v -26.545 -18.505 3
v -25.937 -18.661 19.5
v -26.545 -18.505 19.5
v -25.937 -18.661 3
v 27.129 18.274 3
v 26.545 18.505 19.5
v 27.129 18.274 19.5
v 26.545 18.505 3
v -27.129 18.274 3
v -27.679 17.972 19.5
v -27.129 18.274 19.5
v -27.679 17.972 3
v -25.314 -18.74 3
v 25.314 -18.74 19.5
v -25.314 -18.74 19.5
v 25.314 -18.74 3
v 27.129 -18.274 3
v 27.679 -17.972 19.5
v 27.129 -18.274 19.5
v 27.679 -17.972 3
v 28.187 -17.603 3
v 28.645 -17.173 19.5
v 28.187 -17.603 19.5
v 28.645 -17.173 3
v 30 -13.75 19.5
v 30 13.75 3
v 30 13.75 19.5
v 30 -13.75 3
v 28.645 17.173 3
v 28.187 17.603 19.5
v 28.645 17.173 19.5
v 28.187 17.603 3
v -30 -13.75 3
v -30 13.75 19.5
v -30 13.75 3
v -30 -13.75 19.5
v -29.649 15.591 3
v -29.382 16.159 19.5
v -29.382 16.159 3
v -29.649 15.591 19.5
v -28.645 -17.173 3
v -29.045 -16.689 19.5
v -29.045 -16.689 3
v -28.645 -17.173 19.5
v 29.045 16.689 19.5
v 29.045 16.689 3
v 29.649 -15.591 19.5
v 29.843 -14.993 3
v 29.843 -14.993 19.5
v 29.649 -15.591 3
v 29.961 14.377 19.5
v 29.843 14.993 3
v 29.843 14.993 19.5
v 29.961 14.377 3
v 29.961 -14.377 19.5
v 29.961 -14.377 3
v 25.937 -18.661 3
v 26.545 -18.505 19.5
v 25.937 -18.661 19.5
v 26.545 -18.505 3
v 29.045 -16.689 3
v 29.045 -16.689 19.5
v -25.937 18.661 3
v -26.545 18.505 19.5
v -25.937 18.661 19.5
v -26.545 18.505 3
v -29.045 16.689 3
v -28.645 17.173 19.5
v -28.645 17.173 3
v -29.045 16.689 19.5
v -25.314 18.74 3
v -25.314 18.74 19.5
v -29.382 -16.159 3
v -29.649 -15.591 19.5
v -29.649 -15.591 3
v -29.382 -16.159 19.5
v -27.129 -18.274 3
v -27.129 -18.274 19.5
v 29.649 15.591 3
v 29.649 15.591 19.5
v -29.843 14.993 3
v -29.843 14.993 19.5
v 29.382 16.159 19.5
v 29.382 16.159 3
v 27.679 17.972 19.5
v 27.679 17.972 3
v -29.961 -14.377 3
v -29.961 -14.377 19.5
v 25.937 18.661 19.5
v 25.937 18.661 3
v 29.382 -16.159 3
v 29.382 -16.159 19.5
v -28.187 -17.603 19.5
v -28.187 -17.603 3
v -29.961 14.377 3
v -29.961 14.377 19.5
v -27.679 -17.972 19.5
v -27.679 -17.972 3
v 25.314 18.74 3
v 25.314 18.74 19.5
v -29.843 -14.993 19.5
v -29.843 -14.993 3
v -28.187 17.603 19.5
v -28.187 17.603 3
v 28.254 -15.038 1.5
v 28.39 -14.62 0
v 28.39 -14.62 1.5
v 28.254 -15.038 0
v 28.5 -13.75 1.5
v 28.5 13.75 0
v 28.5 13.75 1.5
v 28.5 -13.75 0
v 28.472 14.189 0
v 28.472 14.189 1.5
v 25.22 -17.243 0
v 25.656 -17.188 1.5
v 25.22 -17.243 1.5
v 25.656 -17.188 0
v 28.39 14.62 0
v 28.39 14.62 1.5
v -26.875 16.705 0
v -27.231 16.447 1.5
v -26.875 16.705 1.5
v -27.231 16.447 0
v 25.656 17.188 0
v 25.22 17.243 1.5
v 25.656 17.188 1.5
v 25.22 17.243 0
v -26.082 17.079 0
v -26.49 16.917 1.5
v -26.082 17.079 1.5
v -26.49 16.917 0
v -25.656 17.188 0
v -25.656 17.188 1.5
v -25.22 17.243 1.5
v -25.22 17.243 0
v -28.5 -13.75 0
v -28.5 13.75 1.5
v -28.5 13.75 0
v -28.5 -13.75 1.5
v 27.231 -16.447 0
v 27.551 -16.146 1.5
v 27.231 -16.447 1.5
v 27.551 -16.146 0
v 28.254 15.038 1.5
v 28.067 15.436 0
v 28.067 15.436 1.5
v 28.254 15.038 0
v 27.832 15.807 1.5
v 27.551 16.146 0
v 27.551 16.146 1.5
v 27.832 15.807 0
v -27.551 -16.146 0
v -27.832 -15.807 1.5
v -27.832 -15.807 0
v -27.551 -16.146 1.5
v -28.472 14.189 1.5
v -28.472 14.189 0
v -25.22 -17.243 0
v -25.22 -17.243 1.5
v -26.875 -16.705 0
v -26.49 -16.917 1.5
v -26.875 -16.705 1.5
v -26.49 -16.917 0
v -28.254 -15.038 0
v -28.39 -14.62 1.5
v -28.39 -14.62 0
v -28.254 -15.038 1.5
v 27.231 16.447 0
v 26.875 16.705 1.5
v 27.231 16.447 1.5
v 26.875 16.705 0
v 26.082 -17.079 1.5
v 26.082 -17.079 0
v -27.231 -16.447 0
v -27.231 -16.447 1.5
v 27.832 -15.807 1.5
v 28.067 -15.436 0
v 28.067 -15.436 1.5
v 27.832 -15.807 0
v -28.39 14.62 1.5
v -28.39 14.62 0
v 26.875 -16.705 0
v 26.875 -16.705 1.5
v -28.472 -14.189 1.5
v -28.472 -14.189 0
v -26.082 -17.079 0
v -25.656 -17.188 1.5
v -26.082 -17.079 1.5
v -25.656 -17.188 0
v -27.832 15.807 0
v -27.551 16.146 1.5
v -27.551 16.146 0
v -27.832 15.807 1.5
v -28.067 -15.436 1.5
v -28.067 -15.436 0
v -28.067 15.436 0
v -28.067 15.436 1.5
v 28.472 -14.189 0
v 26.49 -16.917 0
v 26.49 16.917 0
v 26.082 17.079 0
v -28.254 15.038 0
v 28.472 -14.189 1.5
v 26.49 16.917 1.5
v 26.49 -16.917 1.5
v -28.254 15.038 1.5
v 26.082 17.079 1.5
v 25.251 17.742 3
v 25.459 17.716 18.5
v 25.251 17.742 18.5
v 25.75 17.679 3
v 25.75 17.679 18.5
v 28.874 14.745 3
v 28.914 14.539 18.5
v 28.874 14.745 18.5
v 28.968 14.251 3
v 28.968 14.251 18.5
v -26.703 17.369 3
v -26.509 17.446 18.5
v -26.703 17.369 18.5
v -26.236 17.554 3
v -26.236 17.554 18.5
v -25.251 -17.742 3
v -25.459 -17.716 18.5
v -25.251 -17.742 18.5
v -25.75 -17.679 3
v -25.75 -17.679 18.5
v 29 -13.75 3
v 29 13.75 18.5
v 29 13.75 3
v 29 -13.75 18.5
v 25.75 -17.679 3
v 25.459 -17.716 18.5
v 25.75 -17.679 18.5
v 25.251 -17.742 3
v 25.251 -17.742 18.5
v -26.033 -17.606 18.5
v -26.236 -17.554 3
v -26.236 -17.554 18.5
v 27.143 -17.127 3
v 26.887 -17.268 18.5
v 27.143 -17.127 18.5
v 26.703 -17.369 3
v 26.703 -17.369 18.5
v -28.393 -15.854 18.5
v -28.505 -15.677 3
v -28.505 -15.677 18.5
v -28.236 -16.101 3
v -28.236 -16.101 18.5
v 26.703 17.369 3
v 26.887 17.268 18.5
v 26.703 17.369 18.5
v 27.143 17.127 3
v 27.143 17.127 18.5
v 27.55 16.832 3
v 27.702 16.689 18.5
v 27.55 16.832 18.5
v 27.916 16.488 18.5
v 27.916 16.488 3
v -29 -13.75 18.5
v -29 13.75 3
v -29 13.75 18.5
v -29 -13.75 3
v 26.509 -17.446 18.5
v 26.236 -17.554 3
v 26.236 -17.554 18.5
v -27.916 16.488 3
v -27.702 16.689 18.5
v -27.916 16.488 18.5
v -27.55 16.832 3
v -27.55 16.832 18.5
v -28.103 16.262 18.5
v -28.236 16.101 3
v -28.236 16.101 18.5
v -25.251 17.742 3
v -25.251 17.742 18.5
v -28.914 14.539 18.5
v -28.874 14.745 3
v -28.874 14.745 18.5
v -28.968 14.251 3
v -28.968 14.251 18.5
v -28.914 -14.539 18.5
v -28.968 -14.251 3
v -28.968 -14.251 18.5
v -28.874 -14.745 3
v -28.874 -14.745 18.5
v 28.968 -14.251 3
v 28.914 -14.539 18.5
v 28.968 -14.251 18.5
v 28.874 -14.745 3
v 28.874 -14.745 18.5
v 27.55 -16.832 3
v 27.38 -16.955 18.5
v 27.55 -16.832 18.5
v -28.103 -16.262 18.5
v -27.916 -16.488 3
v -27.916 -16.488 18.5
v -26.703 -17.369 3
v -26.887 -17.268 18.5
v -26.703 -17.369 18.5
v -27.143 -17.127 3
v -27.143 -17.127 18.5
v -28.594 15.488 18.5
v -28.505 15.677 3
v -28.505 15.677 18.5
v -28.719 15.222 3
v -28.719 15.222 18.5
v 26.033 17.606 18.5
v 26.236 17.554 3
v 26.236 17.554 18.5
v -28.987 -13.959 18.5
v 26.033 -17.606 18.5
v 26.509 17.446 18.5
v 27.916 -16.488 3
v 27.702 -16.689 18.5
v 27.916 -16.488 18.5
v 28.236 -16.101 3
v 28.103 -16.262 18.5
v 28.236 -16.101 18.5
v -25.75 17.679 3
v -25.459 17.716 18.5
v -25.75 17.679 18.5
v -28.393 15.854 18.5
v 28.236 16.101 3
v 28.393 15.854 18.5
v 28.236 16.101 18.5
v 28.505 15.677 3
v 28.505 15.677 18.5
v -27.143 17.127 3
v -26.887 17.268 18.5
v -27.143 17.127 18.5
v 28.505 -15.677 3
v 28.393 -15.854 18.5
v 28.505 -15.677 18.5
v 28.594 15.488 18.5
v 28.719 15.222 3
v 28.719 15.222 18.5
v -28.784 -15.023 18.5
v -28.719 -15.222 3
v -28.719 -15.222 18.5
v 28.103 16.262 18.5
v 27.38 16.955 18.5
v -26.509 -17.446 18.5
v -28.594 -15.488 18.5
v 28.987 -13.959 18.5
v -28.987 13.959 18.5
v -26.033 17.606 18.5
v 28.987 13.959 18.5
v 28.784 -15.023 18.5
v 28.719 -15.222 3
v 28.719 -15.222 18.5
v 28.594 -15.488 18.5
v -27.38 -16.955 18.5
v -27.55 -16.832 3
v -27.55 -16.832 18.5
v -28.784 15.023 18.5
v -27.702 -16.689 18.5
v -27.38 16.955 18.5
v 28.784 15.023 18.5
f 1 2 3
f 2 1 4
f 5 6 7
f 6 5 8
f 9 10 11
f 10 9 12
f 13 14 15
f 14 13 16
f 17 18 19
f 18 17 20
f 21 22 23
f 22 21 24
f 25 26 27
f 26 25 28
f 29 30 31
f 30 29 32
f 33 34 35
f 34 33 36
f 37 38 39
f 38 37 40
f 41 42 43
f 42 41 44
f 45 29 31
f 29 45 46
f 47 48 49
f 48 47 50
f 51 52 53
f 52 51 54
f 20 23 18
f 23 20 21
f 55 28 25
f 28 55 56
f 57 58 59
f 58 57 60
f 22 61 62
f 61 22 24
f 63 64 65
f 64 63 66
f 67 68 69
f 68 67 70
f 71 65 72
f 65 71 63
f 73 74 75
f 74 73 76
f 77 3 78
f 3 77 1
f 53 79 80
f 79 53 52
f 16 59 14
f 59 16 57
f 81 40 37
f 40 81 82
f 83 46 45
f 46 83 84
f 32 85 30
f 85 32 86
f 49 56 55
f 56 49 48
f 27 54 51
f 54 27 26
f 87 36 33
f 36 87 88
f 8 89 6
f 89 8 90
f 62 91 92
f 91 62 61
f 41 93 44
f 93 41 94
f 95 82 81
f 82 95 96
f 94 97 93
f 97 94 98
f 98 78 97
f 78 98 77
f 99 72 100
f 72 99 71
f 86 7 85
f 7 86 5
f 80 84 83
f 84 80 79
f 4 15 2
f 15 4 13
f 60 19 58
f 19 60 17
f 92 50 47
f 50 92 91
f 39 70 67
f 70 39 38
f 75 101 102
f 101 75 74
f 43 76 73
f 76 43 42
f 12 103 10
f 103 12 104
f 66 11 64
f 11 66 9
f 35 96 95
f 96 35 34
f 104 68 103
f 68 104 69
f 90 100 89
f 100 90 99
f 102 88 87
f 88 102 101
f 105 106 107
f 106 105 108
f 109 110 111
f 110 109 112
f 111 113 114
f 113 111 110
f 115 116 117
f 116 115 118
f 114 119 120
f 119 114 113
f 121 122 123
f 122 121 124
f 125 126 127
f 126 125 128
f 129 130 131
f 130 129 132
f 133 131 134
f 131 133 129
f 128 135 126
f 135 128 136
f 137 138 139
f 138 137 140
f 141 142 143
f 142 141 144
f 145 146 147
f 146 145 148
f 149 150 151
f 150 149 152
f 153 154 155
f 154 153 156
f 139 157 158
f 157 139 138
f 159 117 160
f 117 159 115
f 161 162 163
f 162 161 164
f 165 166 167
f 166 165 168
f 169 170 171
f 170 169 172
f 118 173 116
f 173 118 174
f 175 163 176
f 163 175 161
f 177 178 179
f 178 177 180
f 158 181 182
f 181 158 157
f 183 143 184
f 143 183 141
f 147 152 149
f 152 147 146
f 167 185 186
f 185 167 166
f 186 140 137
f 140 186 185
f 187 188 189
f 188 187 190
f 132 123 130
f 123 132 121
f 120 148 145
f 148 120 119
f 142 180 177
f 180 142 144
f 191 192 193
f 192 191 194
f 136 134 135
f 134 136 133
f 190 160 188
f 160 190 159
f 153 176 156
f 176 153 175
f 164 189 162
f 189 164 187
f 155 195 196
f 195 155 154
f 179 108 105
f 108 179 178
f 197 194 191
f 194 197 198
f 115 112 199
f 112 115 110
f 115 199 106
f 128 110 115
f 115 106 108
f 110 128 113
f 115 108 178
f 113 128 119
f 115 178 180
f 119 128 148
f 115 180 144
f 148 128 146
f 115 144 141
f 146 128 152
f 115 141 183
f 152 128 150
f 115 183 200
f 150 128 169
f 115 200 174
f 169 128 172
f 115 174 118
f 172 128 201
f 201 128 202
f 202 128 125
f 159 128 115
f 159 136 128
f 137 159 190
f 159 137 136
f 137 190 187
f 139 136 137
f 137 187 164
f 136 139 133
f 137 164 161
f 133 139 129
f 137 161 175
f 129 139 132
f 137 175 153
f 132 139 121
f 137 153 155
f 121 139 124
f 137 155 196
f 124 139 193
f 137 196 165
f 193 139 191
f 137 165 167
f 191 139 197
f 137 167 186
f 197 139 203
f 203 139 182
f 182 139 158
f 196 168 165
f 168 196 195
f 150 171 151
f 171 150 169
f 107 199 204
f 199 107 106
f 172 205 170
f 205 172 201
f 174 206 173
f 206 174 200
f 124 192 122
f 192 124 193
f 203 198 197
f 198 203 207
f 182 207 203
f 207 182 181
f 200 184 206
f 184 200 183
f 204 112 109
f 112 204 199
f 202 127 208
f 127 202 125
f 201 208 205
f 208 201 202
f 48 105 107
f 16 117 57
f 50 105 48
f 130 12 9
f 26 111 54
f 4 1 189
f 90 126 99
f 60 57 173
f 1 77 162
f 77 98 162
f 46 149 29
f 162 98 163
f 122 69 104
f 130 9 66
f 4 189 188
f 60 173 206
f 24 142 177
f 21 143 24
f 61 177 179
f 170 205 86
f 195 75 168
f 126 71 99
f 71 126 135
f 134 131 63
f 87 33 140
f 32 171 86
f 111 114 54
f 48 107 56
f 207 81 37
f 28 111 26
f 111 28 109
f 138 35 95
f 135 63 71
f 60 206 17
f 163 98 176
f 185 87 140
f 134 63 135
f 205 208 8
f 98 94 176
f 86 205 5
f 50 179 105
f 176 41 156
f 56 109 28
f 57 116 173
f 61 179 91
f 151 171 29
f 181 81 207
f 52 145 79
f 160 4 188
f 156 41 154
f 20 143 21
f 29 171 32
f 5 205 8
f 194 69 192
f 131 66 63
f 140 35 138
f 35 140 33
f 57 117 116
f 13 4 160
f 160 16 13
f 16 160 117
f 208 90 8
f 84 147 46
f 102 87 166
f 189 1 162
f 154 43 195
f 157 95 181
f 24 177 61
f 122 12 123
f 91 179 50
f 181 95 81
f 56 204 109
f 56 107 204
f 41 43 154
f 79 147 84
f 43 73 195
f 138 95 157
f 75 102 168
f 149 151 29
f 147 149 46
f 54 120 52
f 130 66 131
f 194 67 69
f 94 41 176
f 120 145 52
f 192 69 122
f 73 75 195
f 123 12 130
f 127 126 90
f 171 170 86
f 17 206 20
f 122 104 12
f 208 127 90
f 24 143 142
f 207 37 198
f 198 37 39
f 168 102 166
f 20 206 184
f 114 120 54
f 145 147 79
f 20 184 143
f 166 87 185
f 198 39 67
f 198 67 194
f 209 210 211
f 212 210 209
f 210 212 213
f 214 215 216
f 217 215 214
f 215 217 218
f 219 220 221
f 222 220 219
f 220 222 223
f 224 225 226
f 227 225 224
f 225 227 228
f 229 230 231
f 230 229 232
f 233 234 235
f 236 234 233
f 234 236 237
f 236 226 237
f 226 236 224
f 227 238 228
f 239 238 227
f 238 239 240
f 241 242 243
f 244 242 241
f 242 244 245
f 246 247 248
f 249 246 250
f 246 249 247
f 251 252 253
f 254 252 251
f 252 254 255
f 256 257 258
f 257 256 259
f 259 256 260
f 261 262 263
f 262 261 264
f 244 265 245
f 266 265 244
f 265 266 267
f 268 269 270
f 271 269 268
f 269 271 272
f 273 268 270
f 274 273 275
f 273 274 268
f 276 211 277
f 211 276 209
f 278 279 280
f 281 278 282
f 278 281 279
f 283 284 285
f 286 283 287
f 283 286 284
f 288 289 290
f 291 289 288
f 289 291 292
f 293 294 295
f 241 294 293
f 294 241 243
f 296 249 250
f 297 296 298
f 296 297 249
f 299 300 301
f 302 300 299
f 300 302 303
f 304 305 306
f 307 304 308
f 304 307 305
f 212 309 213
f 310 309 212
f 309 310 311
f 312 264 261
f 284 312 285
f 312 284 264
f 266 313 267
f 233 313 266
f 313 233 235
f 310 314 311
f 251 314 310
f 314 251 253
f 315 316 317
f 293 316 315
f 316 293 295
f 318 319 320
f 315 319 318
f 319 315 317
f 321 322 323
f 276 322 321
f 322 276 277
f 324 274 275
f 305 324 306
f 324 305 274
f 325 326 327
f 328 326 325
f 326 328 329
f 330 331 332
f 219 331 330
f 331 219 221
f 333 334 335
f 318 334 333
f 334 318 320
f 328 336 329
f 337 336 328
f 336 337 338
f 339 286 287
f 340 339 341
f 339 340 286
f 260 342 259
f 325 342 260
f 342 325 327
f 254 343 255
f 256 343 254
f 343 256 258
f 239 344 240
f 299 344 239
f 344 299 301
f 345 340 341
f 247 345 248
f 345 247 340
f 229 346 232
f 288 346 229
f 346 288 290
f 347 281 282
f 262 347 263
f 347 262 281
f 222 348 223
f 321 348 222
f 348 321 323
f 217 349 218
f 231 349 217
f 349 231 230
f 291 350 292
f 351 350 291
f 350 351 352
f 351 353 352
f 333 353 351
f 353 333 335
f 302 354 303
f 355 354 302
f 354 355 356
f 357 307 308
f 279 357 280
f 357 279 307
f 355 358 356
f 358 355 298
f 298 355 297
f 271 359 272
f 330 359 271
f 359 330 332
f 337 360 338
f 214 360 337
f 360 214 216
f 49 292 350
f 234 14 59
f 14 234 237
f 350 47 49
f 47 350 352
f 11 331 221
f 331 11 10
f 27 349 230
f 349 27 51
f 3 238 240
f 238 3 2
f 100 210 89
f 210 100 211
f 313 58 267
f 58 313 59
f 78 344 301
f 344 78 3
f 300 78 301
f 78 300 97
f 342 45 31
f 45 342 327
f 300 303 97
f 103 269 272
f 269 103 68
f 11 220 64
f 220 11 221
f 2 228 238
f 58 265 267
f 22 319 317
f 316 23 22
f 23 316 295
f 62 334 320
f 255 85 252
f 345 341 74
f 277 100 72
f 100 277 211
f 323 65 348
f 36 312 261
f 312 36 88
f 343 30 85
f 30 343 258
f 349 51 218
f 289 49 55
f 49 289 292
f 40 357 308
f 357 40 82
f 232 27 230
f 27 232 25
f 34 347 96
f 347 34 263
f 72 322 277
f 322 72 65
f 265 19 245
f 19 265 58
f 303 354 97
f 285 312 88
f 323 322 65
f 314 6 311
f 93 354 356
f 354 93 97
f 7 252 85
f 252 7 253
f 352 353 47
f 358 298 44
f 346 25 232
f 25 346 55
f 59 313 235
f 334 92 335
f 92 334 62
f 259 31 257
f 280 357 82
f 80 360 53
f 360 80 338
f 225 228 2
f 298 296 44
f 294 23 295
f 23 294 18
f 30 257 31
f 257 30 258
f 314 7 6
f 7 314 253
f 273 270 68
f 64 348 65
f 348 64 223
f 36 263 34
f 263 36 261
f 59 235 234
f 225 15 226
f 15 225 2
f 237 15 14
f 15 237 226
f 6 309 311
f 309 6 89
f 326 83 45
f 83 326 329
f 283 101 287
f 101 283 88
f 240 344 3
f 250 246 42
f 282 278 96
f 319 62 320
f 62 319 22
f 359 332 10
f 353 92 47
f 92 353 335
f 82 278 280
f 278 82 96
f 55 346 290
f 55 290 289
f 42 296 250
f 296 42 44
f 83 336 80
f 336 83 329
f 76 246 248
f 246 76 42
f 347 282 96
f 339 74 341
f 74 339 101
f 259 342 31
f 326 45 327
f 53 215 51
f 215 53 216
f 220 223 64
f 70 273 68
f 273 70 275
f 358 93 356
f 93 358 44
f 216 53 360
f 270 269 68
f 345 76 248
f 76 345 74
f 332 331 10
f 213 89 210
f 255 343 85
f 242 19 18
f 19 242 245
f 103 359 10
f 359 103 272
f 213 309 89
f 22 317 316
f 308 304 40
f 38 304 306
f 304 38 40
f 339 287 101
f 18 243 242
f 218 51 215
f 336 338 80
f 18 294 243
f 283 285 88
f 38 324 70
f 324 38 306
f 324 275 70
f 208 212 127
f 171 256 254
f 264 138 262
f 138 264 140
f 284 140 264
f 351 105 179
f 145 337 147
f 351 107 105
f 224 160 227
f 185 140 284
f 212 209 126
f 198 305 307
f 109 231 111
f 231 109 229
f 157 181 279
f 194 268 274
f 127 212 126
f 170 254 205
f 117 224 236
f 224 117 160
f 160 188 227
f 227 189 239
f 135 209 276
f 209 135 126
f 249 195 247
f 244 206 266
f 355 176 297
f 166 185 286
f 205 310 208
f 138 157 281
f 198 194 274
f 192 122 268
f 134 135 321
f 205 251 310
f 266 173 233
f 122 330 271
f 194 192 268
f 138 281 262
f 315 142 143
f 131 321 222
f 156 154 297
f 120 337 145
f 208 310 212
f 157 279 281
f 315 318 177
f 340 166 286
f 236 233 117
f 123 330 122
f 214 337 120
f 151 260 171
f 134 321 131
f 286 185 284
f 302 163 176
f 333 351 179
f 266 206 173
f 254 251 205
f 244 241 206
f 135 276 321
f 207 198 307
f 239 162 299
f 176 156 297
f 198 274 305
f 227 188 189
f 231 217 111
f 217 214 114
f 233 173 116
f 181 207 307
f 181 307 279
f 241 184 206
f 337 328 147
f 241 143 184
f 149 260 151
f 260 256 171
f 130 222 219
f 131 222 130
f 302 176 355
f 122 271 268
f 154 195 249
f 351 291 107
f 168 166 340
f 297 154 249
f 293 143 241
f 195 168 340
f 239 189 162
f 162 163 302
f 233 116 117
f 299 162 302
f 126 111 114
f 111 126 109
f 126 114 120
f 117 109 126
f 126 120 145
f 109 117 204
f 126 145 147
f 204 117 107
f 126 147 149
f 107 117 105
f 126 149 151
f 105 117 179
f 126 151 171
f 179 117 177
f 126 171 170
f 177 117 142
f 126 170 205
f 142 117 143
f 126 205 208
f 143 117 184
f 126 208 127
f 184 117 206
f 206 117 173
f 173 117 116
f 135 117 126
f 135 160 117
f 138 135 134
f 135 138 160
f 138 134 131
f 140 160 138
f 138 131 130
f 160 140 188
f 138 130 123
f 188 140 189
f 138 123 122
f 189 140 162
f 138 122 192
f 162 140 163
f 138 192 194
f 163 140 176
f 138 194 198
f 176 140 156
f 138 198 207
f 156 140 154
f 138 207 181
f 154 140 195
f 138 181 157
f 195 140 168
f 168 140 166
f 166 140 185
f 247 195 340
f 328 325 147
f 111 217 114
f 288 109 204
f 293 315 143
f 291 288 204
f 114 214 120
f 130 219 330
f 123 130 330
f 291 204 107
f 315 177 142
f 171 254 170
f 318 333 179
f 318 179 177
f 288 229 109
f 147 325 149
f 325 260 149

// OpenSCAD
$fn = 50;


difference() {
	union() {
		translate(v = [0, 0, 3.0000000000]) {
			hull() {
				translate(v = [-25.0000000000, 13.7500000000, 0]) {
					cylinder(h = 16.5000000000, r = 5);
				}
				translate(v = [25.0000000000, 13.7500000000, 0]) {
					cylinder(h = 16.5000000000, r = 5);
				}
				translate(v = [-25.0000000000, -13.7500000000, 0]) {
					cylinder(h = 16.5000000000, r = 5);
				}
				translate(v = [25.0000000000, -13.7500000000, 0]) {
					cylinder(h = 16.5000000000, r = 5);
				}
			}
		}
		hull() {
			translate(v = [-25.0000000000, 13.7500000000, 0]) {
				cylinder(h = 1.5000000000, r = 3.5000000000);
			}
			translate(v = [25.0000000000, 13.7500000000, 0]) {
				cylinder(h = 1.5000000000, r = 3.5000000000);
			}
			translate(v = [-25.0000000000, -13.7500000000, 0]) {
				cylinder(h = 1.5000000000, r = 3.5000000000);
			}
			translate(v = [25.0000000000, -13.7500000000, 0]) {
				cylinder(h = 1.5000000000, r = 3.5000000000);
			}
		}
		translate(v = [0, 0, 1.5000000000]) {
			hull() {
				translate(v = [-25.0000000000, 13.7500000000, 0]) {
					cylinder(h = 1.5000000000, r = 5, r1 = 3.5000000000, r2 = 5);
				}
				translate(v = [25.0000000000, 13.7500000000, 0]) {
					cylinder(h = 1.5000000000, r = 5, r1 = 3.5000000000, r2 = 5);
				}
				translate(v = [-25.0000000000, -13.7500000000, 0]) {
					cylinder(h = 1.5000000000, r = 5, r1 = 3.5000000000, r2 = 5);
				}
				translate(v = [25.0000000000, -13.7500000000, 0]) {
					cylinder(h = 1.5000000000, r = 5, r1 = 3.5000000000, r2 = 5);
				}
			}
		}
	}
	union() {
		translate(v = [0, 0, 3.0000000000]) {
			hull() {
				translate(v = [-25.0000000000, 13.7500000000, 0]) {
					cylinder(h = 16.5000000000, r = 4);
				}
				translate(v = [25.0000000000, 13.7500000000, 0]) {
					cylinder(h = 16.5000000000, r = 4);
				}
				translate(v = [-25.0000000000, -13.7500000000, 0]) {
					cylinder(h = 16.5000000000, r = 4);
				}
				translate(v = [25.0000000000, -13.7500000000, 0]) {
					cylinder(h = 16.5000000000, r = 4);
				}
			}
		}
		translate(v = [0, 0, 18]) {
			hull() {
				translate(v = [-25.0000000000, 13.7500000000, 0]) {
					cylinder(h = 1.5000000000, r = 5, r1 = 3.5000000000, r2 = 5);
				}
				translate(v = [25.0000000000, 13.7500000000, 0]) {
					cylinder(h = 1.5000000000, r = 5, r1 = 3.5000000000, r2 = 5);
				}
				translate(v = [-25.0000000000, -13.7500000000, 0]) {
					cylinder(h = 1.5000000000, r = 5, r1 = 3.5000000000, r2 = 5);
				}
				translate(v = [25.0000000000, -13.7500000000, 0]) {
					cylinder(h = 1.5000000000, r = 5, r1 = 3.5000000000, r2 = 5);
				}
			}
		}
		translate(v = [0, 0, 1.5000000000]) {
			hull() {
				translate(v = [-25.0000000000, 13.7500000000, 0]) {
					cylinder(h = 1.5000000000, r = 5, r1 = 3.5000000000, r2 = 4);
				}
				translate(v = [25.0000000000, 13.7500000000, 0]) {
					cylinder(h = 1.5000000000, r = 5, r1 = 3.5000000000, r2 = 4);
				}
				translate(v = [-25.0000000000, -13.7500000000, 0]) {
					cylinder(h = 1.5000000000, r = 5, r1 = 3.5000000000, r2 = 4);
				}
				translate(v = [25.0000000000, -13.7500000000, 0]) {
					cylinder(h = 1.5000000000, r = 5, r1 = 3.5000000000, r2 = 4);
				}
			}
		}
	}
}
